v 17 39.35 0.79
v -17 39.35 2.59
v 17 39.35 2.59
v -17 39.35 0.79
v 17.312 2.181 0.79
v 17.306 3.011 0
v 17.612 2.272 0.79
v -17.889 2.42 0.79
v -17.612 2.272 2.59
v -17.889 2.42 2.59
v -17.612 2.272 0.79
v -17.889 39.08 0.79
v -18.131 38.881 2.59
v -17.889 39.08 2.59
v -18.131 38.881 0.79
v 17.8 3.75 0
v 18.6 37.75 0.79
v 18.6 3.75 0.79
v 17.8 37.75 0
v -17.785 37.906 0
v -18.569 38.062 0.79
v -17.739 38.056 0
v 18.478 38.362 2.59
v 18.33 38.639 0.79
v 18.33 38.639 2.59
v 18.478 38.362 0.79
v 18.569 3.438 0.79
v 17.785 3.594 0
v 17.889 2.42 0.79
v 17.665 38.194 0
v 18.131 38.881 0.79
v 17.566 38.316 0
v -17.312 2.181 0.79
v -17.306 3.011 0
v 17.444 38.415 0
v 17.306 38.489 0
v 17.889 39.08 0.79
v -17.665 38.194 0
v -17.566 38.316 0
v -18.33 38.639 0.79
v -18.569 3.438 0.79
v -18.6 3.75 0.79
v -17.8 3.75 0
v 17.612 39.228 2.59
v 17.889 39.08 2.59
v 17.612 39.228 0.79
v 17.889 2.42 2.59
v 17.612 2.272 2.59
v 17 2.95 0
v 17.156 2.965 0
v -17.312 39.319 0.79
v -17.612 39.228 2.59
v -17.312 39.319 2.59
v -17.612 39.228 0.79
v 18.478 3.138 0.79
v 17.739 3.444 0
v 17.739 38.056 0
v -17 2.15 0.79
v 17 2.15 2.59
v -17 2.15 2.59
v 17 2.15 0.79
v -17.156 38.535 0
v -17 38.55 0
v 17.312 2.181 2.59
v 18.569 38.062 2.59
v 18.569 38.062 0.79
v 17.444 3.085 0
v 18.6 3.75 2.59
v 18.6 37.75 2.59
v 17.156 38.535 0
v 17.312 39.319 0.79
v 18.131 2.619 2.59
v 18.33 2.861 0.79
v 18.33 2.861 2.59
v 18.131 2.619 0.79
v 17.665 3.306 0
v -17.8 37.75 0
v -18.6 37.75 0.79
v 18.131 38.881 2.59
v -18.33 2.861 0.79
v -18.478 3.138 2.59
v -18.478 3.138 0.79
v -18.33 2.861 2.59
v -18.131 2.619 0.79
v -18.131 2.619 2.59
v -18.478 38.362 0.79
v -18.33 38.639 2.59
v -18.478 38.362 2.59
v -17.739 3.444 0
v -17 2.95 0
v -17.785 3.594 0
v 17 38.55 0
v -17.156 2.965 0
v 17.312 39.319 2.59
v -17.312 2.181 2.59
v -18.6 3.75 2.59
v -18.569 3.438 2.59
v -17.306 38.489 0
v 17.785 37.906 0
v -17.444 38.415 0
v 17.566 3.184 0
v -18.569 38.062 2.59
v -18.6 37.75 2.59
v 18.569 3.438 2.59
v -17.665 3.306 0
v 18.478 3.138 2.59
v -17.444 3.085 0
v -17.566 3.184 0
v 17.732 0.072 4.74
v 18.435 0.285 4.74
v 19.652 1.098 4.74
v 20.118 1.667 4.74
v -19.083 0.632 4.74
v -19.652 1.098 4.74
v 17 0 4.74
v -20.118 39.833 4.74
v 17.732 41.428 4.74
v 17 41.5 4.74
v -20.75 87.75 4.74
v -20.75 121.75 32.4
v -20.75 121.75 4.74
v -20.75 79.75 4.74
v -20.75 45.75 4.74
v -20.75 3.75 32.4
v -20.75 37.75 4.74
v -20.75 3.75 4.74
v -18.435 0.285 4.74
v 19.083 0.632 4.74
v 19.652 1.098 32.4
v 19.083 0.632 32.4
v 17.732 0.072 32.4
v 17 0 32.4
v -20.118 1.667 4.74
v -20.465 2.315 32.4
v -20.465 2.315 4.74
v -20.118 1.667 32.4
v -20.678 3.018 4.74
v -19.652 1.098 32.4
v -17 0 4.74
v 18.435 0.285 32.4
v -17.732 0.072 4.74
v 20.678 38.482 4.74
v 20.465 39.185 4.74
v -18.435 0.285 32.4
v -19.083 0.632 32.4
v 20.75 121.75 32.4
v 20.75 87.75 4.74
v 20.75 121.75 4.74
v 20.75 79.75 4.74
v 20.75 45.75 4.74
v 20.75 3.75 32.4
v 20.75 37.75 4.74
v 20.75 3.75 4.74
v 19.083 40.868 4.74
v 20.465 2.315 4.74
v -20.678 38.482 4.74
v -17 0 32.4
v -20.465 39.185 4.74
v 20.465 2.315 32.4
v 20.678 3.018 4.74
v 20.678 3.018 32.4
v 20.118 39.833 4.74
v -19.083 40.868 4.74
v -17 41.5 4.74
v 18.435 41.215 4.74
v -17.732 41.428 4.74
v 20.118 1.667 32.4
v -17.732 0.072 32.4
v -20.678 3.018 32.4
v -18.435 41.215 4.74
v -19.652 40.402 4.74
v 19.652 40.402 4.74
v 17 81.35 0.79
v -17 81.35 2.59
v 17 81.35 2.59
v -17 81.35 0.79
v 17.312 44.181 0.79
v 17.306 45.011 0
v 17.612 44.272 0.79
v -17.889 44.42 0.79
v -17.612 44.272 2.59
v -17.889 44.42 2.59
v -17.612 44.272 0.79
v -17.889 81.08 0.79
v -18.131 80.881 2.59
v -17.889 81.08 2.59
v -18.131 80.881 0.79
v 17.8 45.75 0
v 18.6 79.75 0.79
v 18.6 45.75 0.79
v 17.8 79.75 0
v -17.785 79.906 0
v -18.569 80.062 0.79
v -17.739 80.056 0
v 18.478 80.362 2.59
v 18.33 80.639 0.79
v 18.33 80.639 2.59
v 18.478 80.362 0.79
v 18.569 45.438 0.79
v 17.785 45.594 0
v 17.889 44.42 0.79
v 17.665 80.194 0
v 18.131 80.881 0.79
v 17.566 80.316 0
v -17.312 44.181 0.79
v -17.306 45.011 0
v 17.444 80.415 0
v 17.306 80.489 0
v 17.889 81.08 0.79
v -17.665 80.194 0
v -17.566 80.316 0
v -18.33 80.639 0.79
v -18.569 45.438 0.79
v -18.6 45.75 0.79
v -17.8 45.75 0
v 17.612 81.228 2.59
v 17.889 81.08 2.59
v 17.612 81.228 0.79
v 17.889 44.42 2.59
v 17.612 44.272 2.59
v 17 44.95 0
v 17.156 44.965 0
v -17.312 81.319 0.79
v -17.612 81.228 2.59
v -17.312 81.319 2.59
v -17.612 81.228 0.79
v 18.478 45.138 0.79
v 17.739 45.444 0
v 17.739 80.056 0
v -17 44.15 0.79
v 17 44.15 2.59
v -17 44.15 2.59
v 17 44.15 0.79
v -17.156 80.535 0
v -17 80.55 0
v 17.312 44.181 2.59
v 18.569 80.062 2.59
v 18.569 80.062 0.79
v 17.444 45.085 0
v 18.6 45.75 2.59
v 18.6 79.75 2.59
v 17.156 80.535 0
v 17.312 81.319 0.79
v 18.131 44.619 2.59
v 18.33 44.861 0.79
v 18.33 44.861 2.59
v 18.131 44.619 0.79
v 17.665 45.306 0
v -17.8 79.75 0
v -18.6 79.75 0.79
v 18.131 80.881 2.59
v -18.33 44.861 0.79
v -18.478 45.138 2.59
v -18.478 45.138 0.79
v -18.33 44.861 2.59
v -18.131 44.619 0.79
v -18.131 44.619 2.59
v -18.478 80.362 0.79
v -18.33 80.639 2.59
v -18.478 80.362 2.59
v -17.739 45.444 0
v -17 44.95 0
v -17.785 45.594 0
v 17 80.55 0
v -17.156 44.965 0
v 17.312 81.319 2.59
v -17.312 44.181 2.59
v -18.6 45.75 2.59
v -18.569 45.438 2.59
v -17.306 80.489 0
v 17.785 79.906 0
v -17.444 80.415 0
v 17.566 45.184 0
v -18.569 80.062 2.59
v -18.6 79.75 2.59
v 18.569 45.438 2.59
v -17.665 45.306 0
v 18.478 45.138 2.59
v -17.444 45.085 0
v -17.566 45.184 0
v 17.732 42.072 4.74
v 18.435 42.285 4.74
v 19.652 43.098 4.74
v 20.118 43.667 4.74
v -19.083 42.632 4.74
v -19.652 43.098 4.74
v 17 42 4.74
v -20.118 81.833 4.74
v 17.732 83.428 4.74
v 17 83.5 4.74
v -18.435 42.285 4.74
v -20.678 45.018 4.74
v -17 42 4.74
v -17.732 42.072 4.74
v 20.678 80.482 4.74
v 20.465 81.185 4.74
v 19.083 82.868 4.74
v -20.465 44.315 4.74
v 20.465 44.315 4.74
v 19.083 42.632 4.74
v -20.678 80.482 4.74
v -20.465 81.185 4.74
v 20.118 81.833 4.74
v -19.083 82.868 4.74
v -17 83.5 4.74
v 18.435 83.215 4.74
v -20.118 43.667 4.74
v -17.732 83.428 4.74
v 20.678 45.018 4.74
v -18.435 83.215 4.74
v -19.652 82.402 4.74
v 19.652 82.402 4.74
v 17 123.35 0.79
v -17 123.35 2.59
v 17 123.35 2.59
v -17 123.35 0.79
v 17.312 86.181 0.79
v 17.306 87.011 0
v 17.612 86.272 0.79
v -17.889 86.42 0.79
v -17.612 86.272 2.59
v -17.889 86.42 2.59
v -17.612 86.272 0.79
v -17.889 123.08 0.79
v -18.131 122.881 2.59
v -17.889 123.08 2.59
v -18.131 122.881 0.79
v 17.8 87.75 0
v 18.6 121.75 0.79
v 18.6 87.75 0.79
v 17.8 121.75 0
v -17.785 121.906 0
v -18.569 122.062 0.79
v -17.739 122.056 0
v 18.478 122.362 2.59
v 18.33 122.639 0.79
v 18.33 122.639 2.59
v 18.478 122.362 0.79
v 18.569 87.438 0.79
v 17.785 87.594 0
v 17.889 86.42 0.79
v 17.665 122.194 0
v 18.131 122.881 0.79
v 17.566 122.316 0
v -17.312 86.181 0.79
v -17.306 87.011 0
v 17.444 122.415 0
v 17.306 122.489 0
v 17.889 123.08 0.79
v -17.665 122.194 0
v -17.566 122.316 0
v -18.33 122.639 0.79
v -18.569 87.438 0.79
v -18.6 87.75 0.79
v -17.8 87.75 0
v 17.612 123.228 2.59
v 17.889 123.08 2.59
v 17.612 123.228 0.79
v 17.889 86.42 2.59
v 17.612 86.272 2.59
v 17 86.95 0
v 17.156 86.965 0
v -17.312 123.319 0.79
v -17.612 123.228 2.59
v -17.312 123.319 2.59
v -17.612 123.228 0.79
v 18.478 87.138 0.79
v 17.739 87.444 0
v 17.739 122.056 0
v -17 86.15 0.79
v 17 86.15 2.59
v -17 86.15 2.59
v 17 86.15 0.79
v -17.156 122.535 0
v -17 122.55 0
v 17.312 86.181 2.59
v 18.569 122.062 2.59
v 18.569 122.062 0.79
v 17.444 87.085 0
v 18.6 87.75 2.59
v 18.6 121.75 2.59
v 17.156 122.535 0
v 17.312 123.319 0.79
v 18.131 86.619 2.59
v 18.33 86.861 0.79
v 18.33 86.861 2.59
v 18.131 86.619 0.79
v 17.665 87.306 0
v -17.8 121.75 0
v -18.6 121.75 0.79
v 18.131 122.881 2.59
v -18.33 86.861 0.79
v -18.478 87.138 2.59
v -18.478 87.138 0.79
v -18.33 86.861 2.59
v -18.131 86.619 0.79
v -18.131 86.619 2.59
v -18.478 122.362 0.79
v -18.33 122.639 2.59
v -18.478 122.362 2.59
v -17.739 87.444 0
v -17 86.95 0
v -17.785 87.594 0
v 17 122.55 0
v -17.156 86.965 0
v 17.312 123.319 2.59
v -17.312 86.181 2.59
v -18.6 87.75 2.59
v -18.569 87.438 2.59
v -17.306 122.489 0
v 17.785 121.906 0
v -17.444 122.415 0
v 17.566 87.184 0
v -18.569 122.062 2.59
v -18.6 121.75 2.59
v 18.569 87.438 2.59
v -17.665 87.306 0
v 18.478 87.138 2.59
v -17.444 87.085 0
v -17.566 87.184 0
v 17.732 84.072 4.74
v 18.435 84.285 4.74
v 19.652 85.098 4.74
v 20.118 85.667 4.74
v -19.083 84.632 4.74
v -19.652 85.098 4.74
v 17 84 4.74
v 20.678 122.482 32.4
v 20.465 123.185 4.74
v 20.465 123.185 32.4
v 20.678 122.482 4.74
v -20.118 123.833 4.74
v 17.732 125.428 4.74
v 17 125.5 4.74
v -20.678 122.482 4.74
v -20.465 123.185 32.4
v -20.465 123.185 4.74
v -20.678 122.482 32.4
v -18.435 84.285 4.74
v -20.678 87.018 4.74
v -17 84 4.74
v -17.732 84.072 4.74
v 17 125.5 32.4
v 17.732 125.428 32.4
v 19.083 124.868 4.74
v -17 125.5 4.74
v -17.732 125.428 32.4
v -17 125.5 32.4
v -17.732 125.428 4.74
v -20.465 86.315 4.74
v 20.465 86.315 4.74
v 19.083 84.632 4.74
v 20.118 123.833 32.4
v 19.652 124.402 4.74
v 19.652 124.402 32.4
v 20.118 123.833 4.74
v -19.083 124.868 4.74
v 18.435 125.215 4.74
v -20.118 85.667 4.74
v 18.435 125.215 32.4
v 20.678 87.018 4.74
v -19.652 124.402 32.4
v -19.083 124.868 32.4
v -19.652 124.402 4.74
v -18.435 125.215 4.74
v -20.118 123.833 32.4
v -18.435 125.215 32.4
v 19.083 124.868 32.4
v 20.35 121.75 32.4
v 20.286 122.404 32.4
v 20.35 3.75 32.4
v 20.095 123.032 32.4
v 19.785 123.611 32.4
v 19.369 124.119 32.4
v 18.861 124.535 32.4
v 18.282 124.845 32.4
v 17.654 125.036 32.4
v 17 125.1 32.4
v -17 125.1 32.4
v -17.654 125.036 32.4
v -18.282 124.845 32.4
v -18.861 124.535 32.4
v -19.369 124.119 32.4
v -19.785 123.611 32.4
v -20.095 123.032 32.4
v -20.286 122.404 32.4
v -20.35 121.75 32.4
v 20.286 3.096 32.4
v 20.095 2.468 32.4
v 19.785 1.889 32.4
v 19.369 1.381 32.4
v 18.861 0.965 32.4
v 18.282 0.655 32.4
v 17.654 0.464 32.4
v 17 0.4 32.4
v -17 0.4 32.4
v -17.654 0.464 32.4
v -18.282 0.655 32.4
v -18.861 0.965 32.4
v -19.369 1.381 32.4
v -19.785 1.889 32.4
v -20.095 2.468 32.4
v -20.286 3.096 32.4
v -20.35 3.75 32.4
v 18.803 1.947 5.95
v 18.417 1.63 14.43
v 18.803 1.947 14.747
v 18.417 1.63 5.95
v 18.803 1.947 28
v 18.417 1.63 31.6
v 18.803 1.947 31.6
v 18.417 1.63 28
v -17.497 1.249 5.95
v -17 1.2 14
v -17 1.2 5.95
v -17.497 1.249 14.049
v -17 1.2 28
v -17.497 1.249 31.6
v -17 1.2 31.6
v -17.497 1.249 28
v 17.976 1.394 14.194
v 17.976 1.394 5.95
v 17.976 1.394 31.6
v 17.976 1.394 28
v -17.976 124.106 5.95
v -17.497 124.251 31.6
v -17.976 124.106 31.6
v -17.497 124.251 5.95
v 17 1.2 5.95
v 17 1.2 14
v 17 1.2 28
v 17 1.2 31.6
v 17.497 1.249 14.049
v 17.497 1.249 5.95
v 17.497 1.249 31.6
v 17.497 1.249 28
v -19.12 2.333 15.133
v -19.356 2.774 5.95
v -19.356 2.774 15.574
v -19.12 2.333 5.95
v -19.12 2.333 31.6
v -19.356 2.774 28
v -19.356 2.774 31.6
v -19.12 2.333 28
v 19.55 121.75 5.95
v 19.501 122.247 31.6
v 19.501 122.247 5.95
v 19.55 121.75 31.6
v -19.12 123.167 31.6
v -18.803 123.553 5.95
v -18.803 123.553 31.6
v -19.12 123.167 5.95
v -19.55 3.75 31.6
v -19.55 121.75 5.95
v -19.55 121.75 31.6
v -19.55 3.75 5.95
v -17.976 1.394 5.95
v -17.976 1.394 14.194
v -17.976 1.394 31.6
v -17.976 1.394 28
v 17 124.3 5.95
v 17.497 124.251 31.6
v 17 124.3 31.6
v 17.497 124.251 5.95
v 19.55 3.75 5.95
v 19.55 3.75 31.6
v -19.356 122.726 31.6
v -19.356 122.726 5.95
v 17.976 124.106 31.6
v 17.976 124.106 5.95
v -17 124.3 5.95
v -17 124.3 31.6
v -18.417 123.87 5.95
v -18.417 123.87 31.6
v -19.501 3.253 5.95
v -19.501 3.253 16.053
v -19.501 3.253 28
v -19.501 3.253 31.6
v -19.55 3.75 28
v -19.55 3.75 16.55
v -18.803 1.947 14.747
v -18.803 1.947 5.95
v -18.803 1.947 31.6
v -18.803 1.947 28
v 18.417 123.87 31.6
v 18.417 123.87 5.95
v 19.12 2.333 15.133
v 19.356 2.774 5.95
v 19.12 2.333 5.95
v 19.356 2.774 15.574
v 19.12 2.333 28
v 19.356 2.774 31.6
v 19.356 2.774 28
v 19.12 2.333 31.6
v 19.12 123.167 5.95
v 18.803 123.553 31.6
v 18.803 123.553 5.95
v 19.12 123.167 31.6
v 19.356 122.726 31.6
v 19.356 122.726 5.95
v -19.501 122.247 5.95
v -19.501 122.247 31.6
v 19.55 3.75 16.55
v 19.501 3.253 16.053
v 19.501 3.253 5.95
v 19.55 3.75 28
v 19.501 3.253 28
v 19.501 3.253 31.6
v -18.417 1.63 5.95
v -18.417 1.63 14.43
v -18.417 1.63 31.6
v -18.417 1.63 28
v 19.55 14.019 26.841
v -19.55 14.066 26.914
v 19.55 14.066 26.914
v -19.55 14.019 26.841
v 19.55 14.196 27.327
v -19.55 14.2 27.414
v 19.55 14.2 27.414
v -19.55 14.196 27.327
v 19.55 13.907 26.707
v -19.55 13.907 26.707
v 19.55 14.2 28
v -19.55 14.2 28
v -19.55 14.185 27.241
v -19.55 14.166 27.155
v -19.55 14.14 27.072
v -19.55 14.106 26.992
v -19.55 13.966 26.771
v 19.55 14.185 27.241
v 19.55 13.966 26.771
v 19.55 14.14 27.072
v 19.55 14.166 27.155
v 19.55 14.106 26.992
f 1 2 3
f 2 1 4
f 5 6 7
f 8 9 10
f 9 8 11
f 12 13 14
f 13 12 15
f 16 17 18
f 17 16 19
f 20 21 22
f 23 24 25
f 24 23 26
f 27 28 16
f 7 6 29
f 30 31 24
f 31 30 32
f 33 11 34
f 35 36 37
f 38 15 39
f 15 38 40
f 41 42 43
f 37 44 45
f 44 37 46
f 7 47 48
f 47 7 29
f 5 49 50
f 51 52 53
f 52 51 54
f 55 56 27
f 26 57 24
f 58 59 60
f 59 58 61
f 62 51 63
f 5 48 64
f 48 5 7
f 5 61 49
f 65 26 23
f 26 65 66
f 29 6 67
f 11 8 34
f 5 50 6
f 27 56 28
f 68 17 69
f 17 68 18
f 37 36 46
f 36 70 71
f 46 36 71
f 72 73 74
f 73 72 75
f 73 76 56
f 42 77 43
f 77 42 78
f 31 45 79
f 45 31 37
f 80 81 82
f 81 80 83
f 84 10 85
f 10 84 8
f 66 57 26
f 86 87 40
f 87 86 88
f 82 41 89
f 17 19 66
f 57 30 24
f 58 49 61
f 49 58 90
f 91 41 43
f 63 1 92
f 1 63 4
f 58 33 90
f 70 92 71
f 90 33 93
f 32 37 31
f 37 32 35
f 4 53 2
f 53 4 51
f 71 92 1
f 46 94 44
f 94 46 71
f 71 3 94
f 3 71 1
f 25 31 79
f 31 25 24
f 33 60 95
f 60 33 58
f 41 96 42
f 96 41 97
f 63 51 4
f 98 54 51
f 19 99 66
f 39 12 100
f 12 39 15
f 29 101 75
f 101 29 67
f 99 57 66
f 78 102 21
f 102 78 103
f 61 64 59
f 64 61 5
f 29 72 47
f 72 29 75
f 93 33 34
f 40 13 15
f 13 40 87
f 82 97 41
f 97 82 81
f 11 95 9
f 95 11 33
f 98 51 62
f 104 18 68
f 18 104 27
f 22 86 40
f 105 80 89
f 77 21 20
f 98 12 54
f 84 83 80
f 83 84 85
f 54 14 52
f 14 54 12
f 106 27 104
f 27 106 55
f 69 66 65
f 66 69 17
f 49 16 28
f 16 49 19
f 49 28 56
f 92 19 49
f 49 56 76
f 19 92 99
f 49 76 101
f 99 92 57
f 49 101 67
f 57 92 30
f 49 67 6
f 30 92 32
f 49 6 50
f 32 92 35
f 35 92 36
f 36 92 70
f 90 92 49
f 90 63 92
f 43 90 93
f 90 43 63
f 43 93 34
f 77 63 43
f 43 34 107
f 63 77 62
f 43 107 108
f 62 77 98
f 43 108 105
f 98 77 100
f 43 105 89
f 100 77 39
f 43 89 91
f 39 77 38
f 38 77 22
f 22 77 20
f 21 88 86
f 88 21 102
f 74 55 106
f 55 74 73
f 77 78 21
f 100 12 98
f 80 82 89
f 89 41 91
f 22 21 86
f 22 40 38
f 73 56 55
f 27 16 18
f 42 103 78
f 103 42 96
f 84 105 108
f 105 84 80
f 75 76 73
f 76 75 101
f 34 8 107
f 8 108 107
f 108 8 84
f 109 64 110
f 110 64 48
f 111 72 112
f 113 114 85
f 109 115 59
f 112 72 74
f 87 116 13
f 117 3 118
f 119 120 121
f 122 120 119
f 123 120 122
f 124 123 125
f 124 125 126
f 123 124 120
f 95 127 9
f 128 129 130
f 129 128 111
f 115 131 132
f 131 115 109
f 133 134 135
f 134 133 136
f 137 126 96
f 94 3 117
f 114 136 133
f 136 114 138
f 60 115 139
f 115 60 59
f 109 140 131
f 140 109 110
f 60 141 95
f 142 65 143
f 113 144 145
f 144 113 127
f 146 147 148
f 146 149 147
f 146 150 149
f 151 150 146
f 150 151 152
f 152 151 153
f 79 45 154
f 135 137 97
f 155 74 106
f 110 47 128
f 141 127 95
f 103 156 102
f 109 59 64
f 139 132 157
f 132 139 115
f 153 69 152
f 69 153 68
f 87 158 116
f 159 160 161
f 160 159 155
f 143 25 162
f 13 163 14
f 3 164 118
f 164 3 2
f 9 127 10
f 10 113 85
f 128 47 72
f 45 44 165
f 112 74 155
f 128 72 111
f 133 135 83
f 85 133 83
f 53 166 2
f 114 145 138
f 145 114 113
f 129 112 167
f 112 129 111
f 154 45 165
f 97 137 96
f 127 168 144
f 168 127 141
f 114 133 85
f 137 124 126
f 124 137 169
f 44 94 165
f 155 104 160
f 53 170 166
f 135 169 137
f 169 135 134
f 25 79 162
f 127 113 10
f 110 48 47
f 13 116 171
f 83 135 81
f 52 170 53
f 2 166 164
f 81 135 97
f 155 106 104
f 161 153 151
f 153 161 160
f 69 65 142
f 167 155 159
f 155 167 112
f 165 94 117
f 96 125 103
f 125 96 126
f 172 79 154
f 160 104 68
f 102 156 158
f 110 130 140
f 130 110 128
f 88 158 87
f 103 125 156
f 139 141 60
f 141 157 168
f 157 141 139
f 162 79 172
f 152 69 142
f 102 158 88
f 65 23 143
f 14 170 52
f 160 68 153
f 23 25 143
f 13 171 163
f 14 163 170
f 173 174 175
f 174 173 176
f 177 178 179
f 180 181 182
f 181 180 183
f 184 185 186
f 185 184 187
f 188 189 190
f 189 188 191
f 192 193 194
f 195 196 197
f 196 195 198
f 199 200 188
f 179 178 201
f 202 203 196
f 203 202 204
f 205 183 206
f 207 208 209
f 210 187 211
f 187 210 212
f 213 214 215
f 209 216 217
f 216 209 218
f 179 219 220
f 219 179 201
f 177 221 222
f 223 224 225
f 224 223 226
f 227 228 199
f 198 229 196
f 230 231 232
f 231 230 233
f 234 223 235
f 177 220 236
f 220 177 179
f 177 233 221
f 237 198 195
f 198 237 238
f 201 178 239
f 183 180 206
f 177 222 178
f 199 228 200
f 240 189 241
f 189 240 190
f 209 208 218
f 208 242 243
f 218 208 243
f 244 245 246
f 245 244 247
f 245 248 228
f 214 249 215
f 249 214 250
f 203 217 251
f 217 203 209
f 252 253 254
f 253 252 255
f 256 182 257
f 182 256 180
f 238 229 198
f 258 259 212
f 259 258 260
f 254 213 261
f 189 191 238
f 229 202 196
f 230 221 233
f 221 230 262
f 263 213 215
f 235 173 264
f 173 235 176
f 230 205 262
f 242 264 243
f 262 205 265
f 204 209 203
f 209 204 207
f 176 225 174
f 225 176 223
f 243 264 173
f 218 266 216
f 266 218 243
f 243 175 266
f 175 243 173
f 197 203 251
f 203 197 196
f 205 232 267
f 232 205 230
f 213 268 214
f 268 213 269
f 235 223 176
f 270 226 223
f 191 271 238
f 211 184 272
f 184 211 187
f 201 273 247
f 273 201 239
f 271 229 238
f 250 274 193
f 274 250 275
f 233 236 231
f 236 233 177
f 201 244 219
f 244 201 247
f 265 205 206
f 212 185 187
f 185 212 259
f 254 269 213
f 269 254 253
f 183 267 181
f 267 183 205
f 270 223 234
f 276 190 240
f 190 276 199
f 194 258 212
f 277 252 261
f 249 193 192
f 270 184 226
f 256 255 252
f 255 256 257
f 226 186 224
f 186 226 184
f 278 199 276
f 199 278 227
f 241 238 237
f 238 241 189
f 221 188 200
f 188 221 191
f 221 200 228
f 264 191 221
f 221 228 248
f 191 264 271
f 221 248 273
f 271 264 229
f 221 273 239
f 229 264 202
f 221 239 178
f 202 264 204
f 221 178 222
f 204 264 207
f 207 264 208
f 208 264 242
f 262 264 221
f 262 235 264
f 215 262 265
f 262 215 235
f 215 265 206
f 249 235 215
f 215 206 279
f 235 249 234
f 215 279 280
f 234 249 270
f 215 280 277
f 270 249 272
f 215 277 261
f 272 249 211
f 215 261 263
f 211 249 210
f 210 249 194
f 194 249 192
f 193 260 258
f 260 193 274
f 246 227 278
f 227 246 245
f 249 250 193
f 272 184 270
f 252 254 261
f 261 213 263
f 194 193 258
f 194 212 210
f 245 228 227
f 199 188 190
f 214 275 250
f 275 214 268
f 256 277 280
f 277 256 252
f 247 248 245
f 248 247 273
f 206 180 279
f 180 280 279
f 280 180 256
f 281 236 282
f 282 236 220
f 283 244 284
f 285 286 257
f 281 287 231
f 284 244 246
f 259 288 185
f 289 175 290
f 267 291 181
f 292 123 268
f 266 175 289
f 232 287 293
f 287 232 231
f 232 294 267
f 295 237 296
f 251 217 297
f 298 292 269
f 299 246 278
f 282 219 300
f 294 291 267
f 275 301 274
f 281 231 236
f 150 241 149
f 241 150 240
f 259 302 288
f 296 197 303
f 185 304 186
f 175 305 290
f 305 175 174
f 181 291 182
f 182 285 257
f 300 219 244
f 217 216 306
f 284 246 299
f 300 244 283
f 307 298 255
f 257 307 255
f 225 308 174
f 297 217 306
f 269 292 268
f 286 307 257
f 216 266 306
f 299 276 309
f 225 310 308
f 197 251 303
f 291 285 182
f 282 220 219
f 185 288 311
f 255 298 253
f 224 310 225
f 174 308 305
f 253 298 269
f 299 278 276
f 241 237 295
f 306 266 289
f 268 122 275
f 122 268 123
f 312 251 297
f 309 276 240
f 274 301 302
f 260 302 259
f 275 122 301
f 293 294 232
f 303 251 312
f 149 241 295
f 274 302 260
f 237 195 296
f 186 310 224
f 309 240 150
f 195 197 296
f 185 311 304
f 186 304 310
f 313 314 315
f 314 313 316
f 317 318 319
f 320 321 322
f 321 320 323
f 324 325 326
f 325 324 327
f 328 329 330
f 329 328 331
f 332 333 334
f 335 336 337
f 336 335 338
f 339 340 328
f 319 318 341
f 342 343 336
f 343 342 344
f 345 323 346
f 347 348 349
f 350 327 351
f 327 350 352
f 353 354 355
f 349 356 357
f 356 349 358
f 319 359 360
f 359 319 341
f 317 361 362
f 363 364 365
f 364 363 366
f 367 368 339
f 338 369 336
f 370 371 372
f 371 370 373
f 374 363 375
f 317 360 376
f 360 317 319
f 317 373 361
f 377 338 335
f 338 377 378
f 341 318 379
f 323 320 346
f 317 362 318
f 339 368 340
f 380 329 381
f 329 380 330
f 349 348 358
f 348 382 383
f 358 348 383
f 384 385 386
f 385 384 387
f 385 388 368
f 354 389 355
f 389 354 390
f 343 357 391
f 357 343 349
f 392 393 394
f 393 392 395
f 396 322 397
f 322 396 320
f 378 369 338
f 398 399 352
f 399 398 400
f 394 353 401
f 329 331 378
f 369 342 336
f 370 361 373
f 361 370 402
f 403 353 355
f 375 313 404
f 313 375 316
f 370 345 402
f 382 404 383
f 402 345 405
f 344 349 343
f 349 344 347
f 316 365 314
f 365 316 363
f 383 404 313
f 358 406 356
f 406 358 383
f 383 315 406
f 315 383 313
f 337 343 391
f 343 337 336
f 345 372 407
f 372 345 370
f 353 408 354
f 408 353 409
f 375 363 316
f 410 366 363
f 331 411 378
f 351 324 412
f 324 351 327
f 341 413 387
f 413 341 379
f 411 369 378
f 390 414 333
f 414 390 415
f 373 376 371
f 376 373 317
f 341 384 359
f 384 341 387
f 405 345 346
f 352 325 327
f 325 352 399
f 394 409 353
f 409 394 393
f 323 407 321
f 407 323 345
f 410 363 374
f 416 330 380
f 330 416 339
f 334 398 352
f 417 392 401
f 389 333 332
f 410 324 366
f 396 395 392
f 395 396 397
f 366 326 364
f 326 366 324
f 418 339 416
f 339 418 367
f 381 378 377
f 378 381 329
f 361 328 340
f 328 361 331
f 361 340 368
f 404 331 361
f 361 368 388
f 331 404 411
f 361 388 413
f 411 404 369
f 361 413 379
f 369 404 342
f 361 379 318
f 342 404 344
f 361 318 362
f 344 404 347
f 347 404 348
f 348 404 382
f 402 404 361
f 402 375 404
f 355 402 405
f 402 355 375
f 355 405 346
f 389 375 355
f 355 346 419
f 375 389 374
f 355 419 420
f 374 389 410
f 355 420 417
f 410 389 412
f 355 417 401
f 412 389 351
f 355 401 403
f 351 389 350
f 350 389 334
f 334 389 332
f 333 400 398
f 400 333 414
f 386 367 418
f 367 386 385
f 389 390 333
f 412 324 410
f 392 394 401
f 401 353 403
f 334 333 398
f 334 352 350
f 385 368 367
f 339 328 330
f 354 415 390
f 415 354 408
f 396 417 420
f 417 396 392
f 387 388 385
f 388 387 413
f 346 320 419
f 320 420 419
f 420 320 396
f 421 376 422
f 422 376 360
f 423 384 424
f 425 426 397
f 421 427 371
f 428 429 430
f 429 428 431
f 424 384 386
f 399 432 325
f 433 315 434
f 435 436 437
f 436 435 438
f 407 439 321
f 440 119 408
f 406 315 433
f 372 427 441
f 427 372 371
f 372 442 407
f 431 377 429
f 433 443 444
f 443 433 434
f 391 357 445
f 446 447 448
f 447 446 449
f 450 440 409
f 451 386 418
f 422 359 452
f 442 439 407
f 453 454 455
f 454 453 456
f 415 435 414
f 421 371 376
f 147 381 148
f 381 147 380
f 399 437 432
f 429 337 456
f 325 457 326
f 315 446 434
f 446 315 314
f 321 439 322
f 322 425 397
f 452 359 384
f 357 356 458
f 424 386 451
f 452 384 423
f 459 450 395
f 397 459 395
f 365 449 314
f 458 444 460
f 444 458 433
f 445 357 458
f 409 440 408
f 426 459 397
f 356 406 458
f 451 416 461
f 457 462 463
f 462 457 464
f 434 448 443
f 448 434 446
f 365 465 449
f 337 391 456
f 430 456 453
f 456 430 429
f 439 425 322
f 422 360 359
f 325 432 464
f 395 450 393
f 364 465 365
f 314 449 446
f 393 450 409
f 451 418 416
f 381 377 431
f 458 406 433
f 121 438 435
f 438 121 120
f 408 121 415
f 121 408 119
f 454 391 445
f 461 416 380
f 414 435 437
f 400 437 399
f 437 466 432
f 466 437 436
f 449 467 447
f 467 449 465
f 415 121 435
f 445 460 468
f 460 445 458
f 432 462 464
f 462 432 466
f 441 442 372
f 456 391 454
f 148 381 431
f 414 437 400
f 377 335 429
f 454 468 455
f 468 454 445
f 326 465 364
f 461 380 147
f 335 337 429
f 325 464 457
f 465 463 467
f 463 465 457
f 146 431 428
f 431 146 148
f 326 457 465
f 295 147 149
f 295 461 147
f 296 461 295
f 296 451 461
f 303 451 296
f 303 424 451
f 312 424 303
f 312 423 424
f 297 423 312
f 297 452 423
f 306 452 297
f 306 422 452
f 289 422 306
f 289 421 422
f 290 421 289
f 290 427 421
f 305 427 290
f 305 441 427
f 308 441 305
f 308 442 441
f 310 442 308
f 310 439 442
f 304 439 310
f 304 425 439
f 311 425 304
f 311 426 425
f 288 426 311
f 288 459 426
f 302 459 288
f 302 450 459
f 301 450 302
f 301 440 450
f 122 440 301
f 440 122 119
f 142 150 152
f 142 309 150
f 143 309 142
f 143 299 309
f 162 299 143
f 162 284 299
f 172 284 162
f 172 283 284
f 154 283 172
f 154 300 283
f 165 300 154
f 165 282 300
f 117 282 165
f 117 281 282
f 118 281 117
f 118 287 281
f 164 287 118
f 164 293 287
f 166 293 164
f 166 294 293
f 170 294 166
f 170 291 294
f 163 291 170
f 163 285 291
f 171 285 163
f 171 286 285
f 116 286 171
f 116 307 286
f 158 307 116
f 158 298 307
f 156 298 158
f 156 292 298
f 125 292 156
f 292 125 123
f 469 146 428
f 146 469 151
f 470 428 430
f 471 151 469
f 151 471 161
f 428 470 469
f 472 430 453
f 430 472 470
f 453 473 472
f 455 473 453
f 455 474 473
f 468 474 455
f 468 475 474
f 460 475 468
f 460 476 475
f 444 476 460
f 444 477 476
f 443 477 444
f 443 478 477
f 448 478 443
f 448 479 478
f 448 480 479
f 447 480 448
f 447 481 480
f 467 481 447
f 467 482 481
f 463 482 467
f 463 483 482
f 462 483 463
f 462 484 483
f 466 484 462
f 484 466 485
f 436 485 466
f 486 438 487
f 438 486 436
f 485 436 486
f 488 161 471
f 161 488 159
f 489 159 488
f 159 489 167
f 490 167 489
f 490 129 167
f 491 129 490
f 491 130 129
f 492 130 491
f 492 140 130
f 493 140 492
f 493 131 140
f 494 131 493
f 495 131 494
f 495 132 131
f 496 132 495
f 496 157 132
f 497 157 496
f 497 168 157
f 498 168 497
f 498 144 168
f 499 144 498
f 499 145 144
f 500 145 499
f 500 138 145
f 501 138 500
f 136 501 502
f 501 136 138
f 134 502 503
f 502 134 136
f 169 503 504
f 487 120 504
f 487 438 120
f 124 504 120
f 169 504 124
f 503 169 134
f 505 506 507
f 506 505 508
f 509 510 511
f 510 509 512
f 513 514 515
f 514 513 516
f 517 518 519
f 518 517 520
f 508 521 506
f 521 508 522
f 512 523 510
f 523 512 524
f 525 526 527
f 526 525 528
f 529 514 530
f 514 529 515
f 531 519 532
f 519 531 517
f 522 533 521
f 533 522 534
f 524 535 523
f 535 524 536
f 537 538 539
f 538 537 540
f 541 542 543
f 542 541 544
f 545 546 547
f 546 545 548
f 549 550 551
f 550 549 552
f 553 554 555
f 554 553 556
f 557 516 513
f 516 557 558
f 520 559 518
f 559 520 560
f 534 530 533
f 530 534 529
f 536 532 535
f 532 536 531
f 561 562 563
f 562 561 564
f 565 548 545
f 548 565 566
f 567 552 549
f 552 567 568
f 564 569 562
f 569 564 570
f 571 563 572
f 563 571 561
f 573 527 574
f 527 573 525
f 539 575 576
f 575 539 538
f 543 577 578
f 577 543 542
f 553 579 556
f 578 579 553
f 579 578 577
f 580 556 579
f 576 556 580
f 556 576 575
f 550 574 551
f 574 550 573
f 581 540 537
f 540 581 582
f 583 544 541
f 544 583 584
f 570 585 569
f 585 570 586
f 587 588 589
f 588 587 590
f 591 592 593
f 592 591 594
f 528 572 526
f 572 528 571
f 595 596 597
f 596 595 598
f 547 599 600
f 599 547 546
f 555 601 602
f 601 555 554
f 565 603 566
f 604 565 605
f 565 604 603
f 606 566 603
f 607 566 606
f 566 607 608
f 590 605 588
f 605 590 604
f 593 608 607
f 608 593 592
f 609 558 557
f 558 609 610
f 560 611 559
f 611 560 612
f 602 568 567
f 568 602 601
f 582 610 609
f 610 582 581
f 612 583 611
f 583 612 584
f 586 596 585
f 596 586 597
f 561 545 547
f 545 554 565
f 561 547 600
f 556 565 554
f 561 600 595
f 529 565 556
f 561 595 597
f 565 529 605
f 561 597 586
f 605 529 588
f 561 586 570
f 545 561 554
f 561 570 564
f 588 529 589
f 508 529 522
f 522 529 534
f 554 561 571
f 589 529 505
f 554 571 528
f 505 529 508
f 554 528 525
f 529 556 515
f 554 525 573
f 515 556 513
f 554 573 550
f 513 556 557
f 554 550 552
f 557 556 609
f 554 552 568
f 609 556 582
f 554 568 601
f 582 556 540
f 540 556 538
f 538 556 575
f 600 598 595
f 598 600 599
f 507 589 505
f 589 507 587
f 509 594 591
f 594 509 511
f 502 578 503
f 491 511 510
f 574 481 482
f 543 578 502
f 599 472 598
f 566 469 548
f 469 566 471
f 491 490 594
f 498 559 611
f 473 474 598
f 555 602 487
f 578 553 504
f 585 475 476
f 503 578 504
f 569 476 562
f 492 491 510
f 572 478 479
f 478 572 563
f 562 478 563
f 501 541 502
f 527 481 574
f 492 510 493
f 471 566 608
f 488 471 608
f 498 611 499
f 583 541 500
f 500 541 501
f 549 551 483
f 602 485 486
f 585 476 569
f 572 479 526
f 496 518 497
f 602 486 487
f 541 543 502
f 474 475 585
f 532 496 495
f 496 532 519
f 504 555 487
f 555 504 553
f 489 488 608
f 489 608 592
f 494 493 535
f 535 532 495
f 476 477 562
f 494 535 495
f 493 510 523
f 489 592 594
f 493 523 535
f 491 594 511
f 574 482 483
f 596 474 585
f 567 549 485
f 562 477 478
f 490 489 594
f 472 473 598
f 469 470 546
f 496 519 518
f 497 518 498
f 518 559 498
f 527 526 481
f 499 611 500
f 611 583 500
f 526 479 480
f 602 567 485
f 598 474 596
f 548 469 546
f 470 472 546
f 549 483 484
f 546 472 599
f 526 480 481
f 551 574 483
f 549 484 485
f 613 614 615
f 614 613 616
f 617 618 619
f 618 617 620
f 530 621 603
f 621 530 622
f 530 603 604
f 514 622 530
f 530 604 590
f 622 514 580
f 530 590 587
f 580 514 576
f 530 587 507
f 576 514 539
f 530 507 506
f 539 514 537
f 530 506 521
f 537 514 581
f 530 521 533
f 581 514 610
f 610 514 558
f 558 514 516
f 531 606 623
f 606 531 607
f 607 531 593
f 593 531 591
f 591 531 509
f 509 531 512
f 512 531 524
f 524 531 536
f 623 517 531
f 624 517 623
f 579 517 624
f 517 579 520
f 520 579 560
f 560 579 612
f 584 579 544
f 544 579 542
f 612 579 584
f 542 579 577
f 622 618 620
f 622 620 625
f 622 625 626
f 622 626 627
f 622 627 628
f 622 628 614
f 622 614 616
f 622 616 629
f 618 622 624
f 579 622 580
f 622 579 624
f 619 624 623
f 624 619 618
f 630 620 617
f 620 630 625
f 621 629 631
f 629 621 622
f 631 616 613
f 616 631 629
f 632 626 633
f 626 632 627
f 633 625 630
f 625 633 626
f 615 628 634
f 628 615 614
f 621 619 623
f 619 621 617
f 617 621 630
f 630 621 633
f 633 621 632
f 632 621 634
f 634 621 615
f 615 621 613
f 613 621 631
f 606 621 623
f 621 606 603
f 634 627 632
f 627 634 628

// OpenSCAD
// file: ../../modules/gridfinity.scad
// Gridfinity ベースプレートの共有 module。
// 寸法は Gridfinity 仕様 (Zack Freedman) の baseplate 輪郭に従う:
//   ピッチ 42、ソケット上端開口 41.5 (角 R4)、上から 45° 面取り 2.15 →
//   垂直 1.8 (37.2 角・R1.85) → 45° 面取り 0.7 → 底 35.8 角 (R1.15)。
//   ソケット深さ = 2.15 + 1.8 + 0.7 = 4.65。
//
// 座標系: X が列方向 (中央が 0)、Y が行方向 (板の前端が 0)、Z=0 が板の底面。
// 板の外形は grid とは独立に rim で与えるので、grid より大きい板 (縁付き) を
// 作れる。ソケットは rim=[left, right, front, back] の内側へ 42 ピッチで並ぶ。

gf_pitch = 42;
gf_socket_top = 41.5; // 上端開口
gf_socket_mid = 37.2; // 垂直部
gf_socket_bot = 35.8; // 底
gf_socket_r_top = 4;
gf_socket_r_mid = 1.85;
gf_socket_r_bot = 1.15;
gf_chamfer_top = 2.15;
gf_wall_h = 1.8;
gf_chamfer_bot = 0.7;
gf_socket_depth = gf_chamfer_top + gf_wall_h + gf_chamfer_bot; // 4.65
gf_fn = 32;
gf_eps = 0.01; // hull 用の薄板の厚さ
gf_over = 0.5; // 切削の抜き代

// 角丸正方形 (一辺 w、角 R)
module
gf_rounded_square(w, r)
{
    offset(r = r, $fn = gf_fn) square(w - 2 * r, center = true);
}

// 厚さ gf_eps の角丸正方形の薄板を z に置く (hull の骨)
module
gf_slab(w, r, z)
{
    translate([ 0, 0, z ]) linear_extrude(gf_eps) gf_rounded_square(w, r);
}

// ソケット1個の切削体。z=0 がソケットの底 (床の天面)、+Z へ 4.65 で天面に出る。
// clearance は嵌合の逃げで、輪郭を全周へ clearance だけ外へ出す (幅 +2c、角 R
// +c)。 既定 0 が Gridfinity の公称輪郭。深さとピッチは変えない
module
gf_socket_cut(clearance = 0)
{
    z1 = gf_chamfer_bot;
    z2 = z1 + gf_wall_h;
    z3 = gf_socket_depth;
    c = clearance;
    hull()
    {
        gf_slab(gf_socket_bot + 2 * c, gf_socket_r_bot + c, 0);
        gf_slab(gf_socket_mid + 2 * c, gf_socket_r_mid + c, z1 - gf_eps);
    }
    hull()
    {
        gf_slab(gf_socket_mid + 2 * c, gf_socket_r_mid + c, z1 - gf_eps);
        gf_slab(gf_socket_mid + 2 * c, gf_socket_r_mid + c, z2 - gf_eps);
    }
    hull()
    {
        gf_slab(gf_socket_mid + 2 * c, gf_socket_r_mid + c, z2 - gf_eps);
        gf_slab(gf_socket_top + 2 * c, gf_socket_r_top + c, z3 - gf_eps);
    }
    // 天面より上へ抜く (天面と同一平面の退化した面を残さない)
    gf_slab(gf_socket_top + 2 * c, gf_socket_r_top + c, z3 - gf_eps);
    translate([ 0, 0, z3 - gf_eps ]) linear_extrude(gf_over + gf_eps)
        gf_rounded_square(gf_socket_top + 2 * c, gf_socket_r_top + c);
}

// ベースプレート。cols x rows のソケットを床 floor_t の上に彫る。
// rim = [left, right, front, back] はソケット列の外側に残す縁の幅。
// 板の幅 = cols*42 + left + right、奥行き = rows*42 + front + back。
// clearance はソケットの嵌合の逃げ (gf_socket_cut を参照)。
module
gf_baseplate(cols, rows, rim = [ 0, 0, 0, 0 ], floor_t = 1, clearance = 0)
{
    grid_w = cols * gf_pitch;
    grid_d = rows * gf_pitch;
    plate_w = grid_w + rim[0] + rim[1];
    plate_d = grid_d + rim[2] + rim[3];
    x0 = -plate_w / 2 + rim[0]; // ソケット列の左端
    difference()
    {
        translate([ -plate_w / 2, 0, 0 ])
            cube([ plate_w, plate_d, floor_t + gf_socket_depth ]);
        for (c = [0:cols - 1], r = [0:rows - 1])
            translate([
                x0 + (c + 0.5) * gf_pitch,
                rim[2] + (r + 0.5) * gf_pitch,
                floor_t
            ]) gf_socket_cut(clearance);
    }
}
// file: ../../modules/gridfinity_bin.scad
include <gridfinity.scad>

// Gridfinity bin (箱) の共有 module。ピッチと角丸は gridfinity.scad
// と共有する。 底の輪郭は Gridfinity 仕様の bin base (下から):
//   35.6 角 (R0.8) → 45° 0.8 → 37.2 角 (R1.6) → 垂直 1.8 → 45° 2.15 → 41.5 角
//   (R3.75) 高さ 0.8 + 1.8 + 2.15 = 4.75。磁石穴・ネジ穴は持たない (無垢)
// 外形はピッチ − 0.5 (1 マス 41.5)、角 R3.75。高さ単位 7 (4U = 28 が壁の上端)。
// リップは「薄いリップ」: 壁 (1.2) をそのまま lip_h (4.4) 伸ばし、内側の上端を
// 45° に落とすだけ。内側に棚 (厚い肉) を持たないので、上に載せる bin は底の
// 面取りをこの 45° に座らせる。
//
// 座標系: X が列方向 (中央 0)、Y が行方向 (手前 = ラベル側が 0)、Z=0 が底面。

gfb_outer = gf_pitch - 0.5; // 41.5
gfb_outer_r = 3.75;
gfb_base_bot = 35.6;
gfb_base_bot_r = 0.8;
gfb_base_mid = 37.2;
gfb_base_mid_r = 1.6;
gfb_base_chamfer_bot = 0.8;
gfb_base_wall_h = 1.8;
gfb_base_chamfer_top = 2.15;
gfb_base_h =
    gfb_base_chamfer_bot + gfb_base_wall_h + gfb_base_chamfer_top; // 4.75
gfb_unit = 7;
gfb_lip_h = 4.4;
gfb_lip_chamfer = 0.8;

// bin 1 マスぶんの底 (無垢)。z=0 が底面、gfb_base_h で外形 41.5 角に達する
module
gfb_base_cell()
{
    z1 = gfb_base_chamfer_bot;
    z2 = z1 + gfb_base_wall_h;
    z3 = gfb_base_h;
    hull()
    {
        gf_slab(gfb_base_bot, gfb_base_bot_r, 0);
        gf_slab(gfb_base_mid, gfb_base_mid_r, z1 - gf_eps);
    }
    hull()
    {
        gf_slab(gfb_base_mid, gfb_base_mid_r, z1 - gf_eps);
        gf_slab(gfb_base_mid, gfb_base_mid_r, z2 - gf_eps);
    }
    hull()
    {
        gf_slab(gfb_base_mid, gfb_base_mid_r, z2 - gf_eps);
        gf_slab(gfb_outer, gfb_outer_r, z3 - gf_eps);
    }
}

// cols x rows の角丸矩形 (外形)
module
gfb_footprint(cols, rows, inset = 0)
{
    w = cols * gf_pitch - 0.5 - 2 * inset;
    d = rows * gf_pitch - 0.5 - 2 * inset;
    translate([ 0, d / 2 + inset ])
        gf_rounded_square_wd(w, d, gfb_outer_r - inset);
}

// 幅 w × 奥行き d の角丸矩形 (中心が原点)
module
gf_rounded_square_wd(w, d, r)
{
    offset(r = r, $fn = gf_fn) square([ w - 2 * r, d - 2 * r ], center = true);
}

// ラベル天板の Y-Z 断面 (y = 壁の内面からの距離、z = 高さ)。天板 (厚さ t) の
// 先端から 45° の斜面が壁まで下りる無垢のくさび。先端の垂直面と斜面の境目
// (135°) を半径 r で丸める: 円弧の中心は先端の角から (-r, r·tan22.5°)、接点は
// 垂直面上の角 + (0, r·tan22.5°) と斜面上の角 + 0.4142r·(-1,-1)。壁の内側へ
// 1 だけ食い込ませて胴体と溶かす
function gfb_label_profile(d, t, h, r) =
    let(y0 = d, z0 = h - t, cy = y0 - r, cz = z0 + r * tan(22.5))
        concat([ [ -1, h ], [ d, h ] ],
               [for (a = [0:-5:-45])[cy + r * cos(a), cz + r* sin(a)]],
               [[ -1, h - t - d - 1 ]]);

// bin 本体。units は高さ (U)。wall / floor_t は壁と床の厚さ。
// label_d > 0 なら手前 (y=0) の壁の上端 (z = units*7) と面一で内側へ label_d
// 張り出す厚さ label_t のラベル天板を付ける。天板の下は 45° の無垢のくさびが
// 壁まで下りる (ブリッジもリブも無い。中身はスライサのインフィル任せ)。
// 天板の先端と 45° 面の境目は半径 label_r で丸める
module
gfb_bin(cols,
        rows,
        units = 4,
        wall = 1.2,
        floor_t = 1.2,
        label_d = 0,
        label_t = 1,
        label_r = 1)
{
    h = units * gfb_unit; // 壁の上端
    top = h + gfb_lip_h;  // リップの上端
    inner_w = cols * gf_pitch - 0.5 - 2 * wall;
    floor_top = gfb_base_h + floor_t;
    union()
    {
        // 底: マスごとの無垢の base
        for (c = [0:cols - 1], r = [0:rows - 1])
            translate([
                (c - (cols - 1) / 2) * gf_pitch,
                (r + 0.5) * gf_pitch - 0.25,
                0
            ]) gfb_base_cell();
        // 胴体: base の上から top
        // まで。内側は床の上を抜く。リップの内側の上端は 45°
        difference()
        {
            translate([ 0, 0, gfb_base_h - gf_eps ])
                linear_extrude(top - gfb_base_h + gf_eps)
                    gfb_footprint(cols, rows);
            translate([ 0, 0, floor_top ])
                linear_extrude(top - floor_top + gf_over)
                    gfb_footprint(cols, rows, wall);
            // リップ内側の面取り: 上端で wall − 0.4 まで開く
            hull()
            {
                translate([ 0, 0, top - gfb_lip_chamfer ])
                    linear_extrude(gf_eps) gfb_footprint(cols, rows, wall);
                translate([ 0, 0, top ]) linear_extrude(gf_over)
                    gfb_footprint(cols, rows, wall - gfb_lip_chamfer);
            }
        }
        // ラベル天板と 45° くさび (内幅いっぱい、同じ断面)。壁へ 1 食い込ませた
        // 矩形の柱なので、角の丸み (R3.75) の外へ出ないよう外形で切り取る
        if (label_d > 0)
            intersection()
            {
                translate([ -inner_w / 2, wall, 0 ]) rotate([ 90, 0, 90 ])
                    linear_extrude(inner_w) polygon(
                        gfb_label_profile(label_d, label_t, h, label_r));
                linear_extrude(top) gfb_footprint(cols, rows);
            }
    }
}
// file: ../../modules/gridfinity_bin_4u.scad
include <gridfinity_bin.scad>

// assets/gridfinity-bin/ の bin 群の共通値と、サイズ 3 引数の払い出し口。
// 単体では何も描かない。設計の経緯と確定値は
// ledger/designs/gridfinity-bin-4u.md が正本。 保証する範囲は cols 1..2 ×
// rows 1..5 × units 4 (assets に並ぶ 10 種)。 cols が X (横)、rows が Y
// (ラベルの壁から奥へ)、units が高さ (7mm 単位)。
wall = 1.2;    // 0.4 ノズル 3 本
floor_t = 1.2; // 底 (4.75) の上に載せる床。床の天面 z = 5.95
label_d = 13;  // 12mm 幅のラベルシールを貼る天板の張り出し
label_t = 1; // 天板の厚さ (user 指定)。下は 45° の無垢のくさび
label_r = 1; // 天板の先端と 45° 面の境目の R (user 指定)

function bin_contract(cols, rows, units) = str("CONTRACT units=",
                                               units,
                                               " pitch=",
                                               gf_pitch,
                                               " outer=",
                                               gfb_outer,
                                               " h=",
                                               units* gfb_unit,
                                               " lip=",
                                               gfb_lip_h,
                                               " base=",
                                               gfb_base_bot,
                                               "/",
                                               gfb_base_mid,
                                               "/",
                                               gfb_outer,
                                               " base_h=",
                                               gfb_base_h,
                                               " wall=",
                                               wall,
                                               " floor_top=",
                                               gfb_base_h + floor_t,
                                               " label=",
                                               label_d,
                                               "x",
                                               label_t,
                                               " wedge=45 fillet=",
                                               label_r,
                                               " bin=",
                                               cols,
                                               "x",
                                               rows,
                                               " size=",
                                               cols* gf_pitch - 0.5,
                                               "x",
                                               rows* gf_pitch - 0.5);

// (cols, rows, units) でラベル付き bin を払い出す。例: gridfinity_bin(2, 4, 4)
module
gridfinity_bin(cols, rows, units = 4)
{
    echo(bin_contract(cols, rows, units));
    gfb_bin(cols, rows, units, wall, floor_t, label_d, label_t, label_r);
}
// main file
include <../../modules/gridfinity_bin_4u.scad>

// 1x3 マス、高さ 4U のラベル天板付き bin。ラベルは手前 (y=0) 側
gridfinity_bin(1, 3, 4);
